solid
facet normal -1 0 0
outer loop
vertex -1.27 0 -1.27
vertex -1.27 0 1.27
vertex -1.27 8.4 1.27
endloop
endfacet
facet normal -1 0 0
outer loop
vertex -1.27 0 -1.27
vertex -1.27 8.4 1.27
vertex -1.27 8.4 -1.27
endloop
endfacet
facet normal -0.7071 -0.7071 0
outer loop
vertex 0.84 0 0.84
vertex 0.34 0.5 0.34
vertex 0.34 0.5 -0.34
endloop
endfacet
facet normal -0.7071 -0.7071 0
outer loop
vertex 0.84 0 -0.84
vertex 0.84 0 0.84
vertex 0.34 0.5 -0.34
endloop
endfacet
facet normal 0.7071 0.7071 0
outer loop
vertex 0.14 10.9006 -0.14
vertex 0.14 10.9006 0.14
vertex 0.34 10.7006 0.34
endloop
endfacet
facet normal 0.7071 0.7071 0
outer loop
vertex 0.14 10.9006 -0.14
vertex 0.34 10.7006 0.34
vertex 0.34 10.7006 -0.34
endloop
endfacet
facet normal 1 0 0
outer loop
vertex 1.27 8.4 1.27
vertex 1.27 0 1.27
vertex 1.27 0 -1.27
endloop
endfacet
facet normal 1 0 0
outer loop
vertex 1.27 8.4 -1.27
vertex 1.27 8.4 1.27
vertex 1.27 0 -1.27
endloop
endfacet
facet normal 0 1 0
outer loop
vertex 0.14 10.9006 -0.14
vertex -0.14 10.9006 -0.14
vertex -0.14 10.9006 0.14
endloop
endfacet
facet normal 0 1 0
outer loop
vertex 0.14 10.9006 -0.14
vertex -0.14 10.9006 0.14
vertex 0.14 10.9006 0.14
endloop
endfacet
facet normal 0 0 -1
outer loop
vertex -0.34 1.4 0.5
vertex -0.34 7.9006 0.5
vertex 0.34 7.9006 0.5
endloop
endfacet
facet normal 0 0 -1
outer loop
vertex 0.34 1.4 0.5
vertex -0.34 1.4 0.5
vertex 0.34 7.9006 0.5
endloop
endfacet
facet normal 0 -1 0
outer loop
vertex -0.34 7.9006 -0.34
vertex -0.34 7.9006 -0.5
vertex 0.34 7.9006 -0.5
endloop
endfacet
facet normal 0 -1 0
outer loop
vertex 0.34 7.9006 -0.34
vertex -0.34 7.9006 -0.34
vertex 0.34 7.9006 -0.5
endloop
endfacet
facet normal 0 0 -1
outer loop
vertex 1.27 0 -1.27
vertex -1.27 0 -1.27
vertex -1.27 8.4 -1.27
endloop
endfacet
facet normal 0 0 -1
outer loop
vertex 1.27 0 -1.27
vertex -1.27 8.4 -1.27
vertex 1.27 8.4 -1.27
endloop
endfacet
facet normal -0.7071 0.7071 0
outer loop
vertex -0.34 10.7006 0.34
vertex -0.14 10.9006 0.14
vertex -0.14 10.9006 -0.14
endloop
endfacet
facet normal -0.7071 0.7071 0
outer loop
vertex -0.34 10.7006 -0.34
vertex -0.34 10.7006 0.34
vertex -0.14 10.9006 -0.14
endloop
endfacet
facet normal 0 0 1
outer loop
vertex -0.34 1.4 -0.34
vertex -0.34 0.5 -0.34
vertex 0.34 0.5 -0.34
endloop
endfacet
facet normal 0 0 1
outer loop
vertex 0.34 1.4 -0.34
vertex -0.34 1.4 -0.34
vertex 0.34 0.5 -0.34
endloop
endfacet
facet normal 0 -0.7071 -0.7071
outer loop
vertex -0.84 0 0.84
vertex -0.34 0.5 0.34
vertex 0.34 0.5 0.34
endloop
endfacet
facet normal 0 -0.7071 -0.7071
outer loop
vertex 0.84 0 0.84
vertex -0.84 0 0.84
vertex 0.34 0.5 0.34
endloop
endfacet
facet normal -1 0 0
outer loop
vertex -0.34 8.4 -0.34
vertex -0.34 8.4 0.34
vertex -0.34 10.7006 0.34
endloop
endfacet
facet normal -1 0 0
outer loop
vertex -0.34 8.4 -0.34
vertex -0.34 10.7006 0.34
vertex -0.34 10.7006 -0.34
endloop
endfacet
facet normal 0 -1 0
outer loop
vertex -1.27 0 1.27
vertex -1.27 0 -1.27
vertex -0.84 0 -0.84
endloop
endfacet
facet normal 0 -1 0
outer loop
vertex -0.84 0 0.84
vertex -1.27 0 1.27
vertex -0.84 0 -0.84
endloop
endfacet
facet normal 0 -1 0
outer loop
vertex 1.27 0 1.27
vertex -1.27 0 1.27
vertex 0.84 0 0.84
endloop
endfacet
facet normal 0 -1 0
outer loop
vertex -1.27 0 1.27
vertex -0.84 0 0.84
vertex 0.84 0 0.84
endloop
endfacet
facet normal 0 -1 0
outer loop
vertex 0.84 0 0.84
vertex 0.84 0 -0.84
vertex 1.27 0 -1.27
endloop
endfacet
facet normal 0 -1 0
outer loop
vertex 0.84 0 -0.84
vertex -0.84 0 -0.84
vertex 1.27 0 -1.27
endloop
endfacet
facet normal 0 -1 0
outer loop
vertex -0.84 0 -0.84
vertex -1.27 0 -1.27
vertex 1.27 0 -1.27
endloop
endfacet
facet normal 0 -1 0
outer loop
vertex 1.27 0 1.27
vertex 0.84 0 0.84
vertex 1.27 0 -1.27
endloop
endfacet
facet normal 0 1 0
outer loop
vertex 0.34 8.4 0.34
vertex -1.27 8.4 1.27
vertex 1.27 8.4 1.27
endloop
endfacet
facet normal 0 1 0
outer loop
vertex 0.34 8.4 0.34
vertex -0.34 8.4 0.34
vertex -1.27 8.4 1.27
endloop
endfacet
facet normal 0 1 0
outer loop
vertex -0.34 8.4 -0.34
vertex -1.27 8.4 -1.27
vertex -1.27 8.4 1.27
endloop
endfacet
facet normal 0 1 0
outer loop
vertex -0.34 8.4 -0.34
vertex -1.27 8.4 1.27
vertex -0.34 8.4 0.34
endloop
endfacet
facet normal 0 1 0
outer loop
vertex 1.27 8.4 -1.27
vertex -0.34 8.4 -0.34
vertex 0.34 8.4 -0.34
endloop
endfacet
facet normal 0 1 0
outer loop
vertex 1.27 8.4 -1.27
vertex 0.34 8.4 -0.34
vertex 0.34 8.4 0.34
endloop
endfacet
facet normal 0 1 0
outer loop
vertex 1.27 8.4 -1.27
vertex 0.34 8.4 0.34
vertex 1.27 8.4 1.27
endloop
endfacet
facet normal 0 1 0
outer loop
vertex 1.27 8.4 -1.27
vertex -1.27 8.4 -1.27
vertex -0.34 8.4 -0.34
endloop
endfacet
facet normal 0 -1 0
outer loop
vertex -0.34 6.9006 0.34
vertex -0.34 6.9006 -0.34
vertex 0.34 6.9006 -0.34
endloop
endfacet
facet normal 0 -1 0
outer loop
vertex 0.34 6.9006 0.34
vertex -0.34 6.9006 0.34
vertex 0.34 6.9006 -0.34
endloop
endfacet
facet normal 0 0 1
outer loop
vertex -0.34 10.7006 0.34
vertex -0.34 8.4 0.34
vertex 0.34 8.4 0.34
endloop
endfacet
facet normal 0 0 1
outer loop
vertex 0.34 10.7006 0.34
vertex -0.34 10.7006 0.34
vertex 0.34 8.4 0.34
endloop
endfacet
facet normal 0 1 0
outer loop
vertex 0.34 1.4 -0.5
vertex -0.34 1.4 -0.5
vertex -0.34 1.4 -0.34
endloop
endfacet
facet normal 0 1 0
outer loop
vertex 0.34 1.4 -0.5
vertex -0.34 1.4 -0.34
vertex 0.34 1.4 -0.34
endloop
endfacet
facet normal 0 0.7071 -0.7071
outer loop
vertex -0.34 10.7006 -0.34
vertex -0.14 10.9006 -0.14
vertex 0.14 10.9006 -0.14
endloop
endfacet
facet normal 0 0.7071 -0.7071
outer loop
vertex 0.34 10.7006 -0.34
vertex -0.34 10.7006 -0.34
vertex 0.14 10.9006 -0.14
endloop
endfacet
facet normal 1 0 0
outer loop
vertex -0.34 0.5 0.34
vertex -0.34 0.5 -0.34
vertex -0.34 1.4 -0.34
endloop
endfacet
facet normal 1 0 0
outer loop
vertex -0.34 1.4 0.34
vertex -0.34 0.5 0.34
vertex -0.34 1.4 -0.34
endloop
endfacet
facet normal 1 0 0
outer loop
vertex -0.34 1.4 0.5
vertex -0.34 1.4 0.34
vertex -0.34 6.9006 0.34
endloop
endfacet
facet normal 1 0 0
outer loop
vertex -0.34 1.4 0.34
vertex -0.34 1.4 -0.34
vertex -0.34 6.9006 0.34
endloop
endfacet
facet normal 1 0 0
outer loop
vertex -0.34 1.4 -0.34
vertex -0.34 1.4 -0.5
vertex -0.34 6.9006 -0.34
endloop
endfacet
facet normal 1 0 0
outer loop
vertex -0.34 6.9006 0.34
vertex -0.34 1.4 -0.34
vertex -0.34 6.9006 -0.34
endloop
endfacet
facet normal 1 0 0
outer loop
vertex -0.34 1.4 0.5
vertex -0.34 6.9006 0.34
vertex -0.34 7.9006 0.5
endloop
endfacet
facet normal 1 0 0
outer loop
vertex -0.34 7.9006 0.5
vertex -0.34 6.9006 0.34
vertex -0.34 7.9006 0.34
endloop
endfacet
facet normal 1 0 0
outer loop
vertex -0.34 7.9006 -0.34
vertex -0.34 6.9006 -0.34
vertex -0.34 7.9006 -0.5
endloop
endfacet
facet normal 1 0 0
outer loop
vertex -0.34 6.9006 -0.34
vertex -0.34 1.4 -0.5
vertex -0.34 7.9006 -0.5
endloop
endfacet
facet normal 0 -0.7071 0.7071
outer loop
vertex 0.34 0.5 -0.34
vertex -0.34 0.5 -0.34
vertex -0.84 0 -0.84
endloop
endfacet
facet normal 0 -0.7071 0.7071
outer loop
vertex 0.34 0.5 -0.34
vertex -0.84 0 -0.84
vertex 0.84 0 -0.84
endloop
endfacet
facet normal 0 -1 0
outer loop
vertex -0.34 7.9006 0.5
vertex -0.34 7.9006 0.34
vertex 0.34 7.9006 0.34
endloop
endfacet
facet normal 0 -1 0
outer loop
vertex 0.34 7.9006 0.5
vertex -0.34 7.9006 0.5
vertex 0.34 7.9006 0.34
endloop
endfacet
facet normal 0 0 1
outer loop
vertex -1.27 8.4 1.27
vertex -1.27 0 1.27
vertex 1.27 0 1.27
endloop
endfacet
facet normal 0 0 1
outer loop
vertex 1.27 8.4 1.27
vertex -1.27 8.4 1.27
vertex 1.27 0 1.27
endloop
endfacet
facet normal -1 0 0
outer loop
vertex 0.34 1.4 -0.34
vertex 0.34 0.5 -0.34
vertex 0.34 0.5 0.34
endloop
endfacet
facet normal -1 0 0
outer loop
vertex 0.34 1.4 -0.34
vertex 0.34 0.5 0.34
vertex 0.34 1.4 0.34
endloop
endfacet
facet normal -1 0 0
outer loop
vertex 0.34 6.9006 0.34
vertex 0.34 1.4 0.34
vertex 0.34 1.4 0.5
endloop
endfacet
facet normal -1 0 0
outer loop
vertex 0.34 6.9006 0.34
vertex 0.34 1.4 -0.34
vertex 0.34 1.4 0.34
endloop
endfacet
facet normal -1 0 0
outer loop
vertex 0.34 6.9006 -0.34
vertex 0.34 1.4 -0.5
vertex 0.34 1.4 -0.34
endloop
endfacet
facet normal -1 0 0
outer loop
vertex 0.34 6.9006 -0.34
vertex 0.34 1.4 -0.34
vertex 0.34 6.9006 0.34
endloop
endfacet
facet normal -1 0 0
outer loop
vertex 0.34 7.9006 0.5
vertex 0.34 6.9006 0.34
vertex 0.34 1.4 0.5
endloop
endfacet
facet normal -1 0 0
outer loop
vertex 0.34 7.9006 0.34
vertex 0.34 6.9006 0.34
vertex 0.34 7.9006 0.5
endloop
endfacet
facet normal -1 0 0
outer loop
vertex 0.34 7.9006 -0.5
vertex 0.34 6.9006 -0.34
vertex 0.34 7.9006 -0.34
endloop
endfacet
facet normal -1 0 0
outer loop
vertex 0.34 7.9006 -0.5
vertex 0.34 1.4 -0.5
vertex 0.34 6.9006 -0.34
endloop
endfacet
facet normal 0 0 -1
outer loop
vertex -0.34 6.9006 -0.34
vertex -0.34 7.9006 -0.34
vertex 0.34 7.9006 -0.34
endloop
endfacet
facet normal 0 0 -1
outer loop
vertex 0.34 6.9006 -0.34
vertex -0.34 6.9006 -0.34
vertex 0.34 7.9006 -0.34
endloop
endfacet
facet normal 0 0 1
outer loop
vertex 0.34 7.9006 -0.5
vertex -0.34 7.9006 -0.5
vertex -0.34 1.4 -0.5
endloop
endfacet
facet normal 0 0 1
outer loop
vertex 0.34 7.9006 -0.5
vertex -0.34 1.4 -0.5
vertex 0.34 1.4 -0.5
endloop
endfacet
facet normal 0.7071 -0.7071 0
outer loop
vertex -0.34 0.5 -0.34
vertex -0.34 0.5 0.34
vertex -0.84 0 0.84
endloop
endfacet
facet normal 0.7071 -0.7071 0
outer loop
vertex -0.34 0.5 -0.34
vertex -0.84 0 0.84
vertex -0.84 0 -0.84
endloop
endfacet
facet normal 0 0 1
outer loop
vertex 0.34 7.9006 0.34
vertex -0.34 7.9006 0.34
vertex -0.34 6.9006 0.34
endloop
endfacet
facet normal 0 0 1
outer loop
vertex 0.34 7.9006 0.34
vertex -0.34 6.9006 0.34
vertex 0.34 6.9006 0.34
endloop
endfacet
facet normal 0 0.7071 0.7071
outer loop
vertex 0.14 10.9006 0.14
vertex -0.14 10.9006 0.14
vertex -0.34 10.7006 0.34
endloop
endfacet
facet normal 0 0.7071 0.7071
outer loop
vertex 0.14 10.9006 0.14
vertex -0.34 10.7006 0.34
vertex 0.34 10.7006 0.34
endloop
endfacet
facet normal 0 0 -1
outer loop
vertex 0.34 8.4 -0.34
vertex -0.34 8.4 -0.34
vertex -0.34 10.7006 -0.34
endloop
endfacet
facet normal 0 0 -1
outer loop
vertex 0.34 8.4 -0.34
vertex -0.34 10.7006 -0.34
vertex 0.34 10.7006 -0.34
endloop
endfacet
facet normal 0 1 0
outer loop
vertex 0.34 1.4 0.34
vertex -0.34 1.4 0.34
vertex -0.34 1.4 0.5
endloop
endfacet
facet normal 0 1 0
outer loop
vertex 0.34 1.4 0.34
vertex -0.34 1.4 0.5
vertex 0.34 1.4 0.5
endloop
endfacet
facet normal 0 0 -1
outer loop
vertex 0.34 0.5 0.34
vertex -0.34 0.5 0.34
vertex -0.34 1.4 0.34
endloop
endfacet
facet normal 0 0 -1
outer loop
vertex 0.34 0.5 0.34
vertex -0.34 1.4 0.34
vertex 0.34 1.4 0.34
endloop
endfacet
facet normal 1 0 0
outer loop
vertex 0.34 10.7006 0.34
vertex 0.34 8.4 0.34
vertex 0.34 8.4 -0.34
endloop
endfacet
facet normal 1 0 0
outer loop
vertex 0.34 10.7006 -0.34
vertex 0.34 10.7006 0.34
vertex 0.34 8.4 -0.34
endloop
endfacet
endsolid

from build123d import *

# Parameters (mm, degrees)
SKETCH1_W                = 2.54
SKETCH1_H                = 2.54
SKETCH1_W_2              = 0.68
SKETCH1_H_2              = 0.68
BOSS_EXTRUDE1_DEPTH      = 8.4
SKETCH2_W                = 1
SKETCH2_H                = 1
CUT_EXTRUDE1_DEPTH       = 7
CHAMFER1_SIZE            = 0.5
BOSS_EXTRUDE2_DEPTH      = 0.5
BOSS_EXTRUDE2_DEPTH_BACK = 0.5
SKETCH4_W                = 0.16
SKETCH4_H                = 6.500631374
BOSS_EXTRUDE3_DEPTH      = 3
BOSS_EXTRUDE3_DEPTH_BACK = 1
SKETCH7_W                = 0.68
SKETCH7_H                = 0.68
SKETCH8_W                = 1
SKETCH8_H                = 1
SKETCH8_W_2              = 0.68
SKETCH8_H_2              = 0.68
BOSS_EXTRUDE4_DEPTH      = 0.499368626
CHAMFER2_SIZE            = 0.2


with BuildPart() as part:
    # Sketch1 → Boss-Extrude1 (new body)
    with BuildSketch(Plane(origin=(0, 0, 0), x_dir=(1, 0, 0), z_dir=(0, 1, 0))):
        Rectangle(SKETCH1_W, SKETCH1_H)
        Rectangle(SKETCH1_W_2, SKETCH1_H_2, mode=Mode.SUBTRACT)
    extrude(amount=BOSS_EXTRUDE1_DEPTH)

    # Sketch2 → Cut-Extrude1 (cut)
    with BuildSketch(Plane(origin=(0, 8.4, 0), x_dir=(1, 0, 0), z_dir=(0, 1, 0))):
        Rectangle(SKETCH2_W, SKETCH2_H)
    extrude(amount=-CUT_EXTRUDE1_DEPTH, mode=Mode.SUBTRACT)

    # Chamfer1
    chamfer1_edges = [part.edges().sort_by_distance(p)[0] for p in [
        (0.34, 0, 0),
        (0, 0, -0.34),
        (-0.34, 0, 0),
        (0, 0, 0.34),
    ]]
    chamfer(chamfer1_edges, length=CHAMFER1_SIZE)

    # Sketch4 → Boss-Extrude2 (add, two sides: drawn at the far end of the back side and taken through both)
    with BuildSketch(Plane.XY.offset(-BOSS_EXTRUDE2_DEPTH_BACK)):
        with Locations((-0.42, 4.650315687)):
            Rectangle(SKETCH4_W, SKETCH4_H)
        with Locations((0.42, 4.650315687)):
            Rectangle(SKETCH4_W, SKETCH4_H)
    extrude(amount=BOSS_EXTRUDE2_DEPTH + BOSS_EXTRUDE2_DEPTH_BACK)

    # Sketch7 → Boss-Extrude3 (add, two sides: drawn at the far end of the back side and taken through both)
    with BuildSketch(Plane(origin=(0, 7.900631374, 0), x_dir=(1, 0, 0), z_dir=(0, 1, 0)).offset(-BOSS_EXTRUDE3_DEPTH_BACK)):
        Rectangle(SKETCH7_W, SKETCH7_H)
    extrude(amount=BOSS_EXTRUDE3_DEPTH + BOSS_EXTRUDE3_DEPTH_BACK)

    # Sketch8 → Boss-Extrude4 (add)
    with BuildSketch(Plane(origin=(0, 8.4, 0), x_dir=(1, 0, 0), z_dir=(0, 1, 0))):
        Rectangle(SKETCH8_W, SKETCH8_H)
        Rectangle(SKETCH8_W_2, SKETCH8_H_2, mode=Mode.SUBTRACT)
    extrude(amount=-BOSS_EXTRUDE4_DEPTH)

    # Chamfer2
    chamfer2_edges = [part.edges().sort_by_distance(p)[0] for p in [
        (0.34, 10.900631374, 0),
        (0, 10.900631374, -0.34),
        (-0.34, 10.900631374, 0),
        (0, 10.900631374, 0.34),
    ]]
    chamfer(chamfer2_edges, length=CHAMFER2_SIZE)


solid = part.part
